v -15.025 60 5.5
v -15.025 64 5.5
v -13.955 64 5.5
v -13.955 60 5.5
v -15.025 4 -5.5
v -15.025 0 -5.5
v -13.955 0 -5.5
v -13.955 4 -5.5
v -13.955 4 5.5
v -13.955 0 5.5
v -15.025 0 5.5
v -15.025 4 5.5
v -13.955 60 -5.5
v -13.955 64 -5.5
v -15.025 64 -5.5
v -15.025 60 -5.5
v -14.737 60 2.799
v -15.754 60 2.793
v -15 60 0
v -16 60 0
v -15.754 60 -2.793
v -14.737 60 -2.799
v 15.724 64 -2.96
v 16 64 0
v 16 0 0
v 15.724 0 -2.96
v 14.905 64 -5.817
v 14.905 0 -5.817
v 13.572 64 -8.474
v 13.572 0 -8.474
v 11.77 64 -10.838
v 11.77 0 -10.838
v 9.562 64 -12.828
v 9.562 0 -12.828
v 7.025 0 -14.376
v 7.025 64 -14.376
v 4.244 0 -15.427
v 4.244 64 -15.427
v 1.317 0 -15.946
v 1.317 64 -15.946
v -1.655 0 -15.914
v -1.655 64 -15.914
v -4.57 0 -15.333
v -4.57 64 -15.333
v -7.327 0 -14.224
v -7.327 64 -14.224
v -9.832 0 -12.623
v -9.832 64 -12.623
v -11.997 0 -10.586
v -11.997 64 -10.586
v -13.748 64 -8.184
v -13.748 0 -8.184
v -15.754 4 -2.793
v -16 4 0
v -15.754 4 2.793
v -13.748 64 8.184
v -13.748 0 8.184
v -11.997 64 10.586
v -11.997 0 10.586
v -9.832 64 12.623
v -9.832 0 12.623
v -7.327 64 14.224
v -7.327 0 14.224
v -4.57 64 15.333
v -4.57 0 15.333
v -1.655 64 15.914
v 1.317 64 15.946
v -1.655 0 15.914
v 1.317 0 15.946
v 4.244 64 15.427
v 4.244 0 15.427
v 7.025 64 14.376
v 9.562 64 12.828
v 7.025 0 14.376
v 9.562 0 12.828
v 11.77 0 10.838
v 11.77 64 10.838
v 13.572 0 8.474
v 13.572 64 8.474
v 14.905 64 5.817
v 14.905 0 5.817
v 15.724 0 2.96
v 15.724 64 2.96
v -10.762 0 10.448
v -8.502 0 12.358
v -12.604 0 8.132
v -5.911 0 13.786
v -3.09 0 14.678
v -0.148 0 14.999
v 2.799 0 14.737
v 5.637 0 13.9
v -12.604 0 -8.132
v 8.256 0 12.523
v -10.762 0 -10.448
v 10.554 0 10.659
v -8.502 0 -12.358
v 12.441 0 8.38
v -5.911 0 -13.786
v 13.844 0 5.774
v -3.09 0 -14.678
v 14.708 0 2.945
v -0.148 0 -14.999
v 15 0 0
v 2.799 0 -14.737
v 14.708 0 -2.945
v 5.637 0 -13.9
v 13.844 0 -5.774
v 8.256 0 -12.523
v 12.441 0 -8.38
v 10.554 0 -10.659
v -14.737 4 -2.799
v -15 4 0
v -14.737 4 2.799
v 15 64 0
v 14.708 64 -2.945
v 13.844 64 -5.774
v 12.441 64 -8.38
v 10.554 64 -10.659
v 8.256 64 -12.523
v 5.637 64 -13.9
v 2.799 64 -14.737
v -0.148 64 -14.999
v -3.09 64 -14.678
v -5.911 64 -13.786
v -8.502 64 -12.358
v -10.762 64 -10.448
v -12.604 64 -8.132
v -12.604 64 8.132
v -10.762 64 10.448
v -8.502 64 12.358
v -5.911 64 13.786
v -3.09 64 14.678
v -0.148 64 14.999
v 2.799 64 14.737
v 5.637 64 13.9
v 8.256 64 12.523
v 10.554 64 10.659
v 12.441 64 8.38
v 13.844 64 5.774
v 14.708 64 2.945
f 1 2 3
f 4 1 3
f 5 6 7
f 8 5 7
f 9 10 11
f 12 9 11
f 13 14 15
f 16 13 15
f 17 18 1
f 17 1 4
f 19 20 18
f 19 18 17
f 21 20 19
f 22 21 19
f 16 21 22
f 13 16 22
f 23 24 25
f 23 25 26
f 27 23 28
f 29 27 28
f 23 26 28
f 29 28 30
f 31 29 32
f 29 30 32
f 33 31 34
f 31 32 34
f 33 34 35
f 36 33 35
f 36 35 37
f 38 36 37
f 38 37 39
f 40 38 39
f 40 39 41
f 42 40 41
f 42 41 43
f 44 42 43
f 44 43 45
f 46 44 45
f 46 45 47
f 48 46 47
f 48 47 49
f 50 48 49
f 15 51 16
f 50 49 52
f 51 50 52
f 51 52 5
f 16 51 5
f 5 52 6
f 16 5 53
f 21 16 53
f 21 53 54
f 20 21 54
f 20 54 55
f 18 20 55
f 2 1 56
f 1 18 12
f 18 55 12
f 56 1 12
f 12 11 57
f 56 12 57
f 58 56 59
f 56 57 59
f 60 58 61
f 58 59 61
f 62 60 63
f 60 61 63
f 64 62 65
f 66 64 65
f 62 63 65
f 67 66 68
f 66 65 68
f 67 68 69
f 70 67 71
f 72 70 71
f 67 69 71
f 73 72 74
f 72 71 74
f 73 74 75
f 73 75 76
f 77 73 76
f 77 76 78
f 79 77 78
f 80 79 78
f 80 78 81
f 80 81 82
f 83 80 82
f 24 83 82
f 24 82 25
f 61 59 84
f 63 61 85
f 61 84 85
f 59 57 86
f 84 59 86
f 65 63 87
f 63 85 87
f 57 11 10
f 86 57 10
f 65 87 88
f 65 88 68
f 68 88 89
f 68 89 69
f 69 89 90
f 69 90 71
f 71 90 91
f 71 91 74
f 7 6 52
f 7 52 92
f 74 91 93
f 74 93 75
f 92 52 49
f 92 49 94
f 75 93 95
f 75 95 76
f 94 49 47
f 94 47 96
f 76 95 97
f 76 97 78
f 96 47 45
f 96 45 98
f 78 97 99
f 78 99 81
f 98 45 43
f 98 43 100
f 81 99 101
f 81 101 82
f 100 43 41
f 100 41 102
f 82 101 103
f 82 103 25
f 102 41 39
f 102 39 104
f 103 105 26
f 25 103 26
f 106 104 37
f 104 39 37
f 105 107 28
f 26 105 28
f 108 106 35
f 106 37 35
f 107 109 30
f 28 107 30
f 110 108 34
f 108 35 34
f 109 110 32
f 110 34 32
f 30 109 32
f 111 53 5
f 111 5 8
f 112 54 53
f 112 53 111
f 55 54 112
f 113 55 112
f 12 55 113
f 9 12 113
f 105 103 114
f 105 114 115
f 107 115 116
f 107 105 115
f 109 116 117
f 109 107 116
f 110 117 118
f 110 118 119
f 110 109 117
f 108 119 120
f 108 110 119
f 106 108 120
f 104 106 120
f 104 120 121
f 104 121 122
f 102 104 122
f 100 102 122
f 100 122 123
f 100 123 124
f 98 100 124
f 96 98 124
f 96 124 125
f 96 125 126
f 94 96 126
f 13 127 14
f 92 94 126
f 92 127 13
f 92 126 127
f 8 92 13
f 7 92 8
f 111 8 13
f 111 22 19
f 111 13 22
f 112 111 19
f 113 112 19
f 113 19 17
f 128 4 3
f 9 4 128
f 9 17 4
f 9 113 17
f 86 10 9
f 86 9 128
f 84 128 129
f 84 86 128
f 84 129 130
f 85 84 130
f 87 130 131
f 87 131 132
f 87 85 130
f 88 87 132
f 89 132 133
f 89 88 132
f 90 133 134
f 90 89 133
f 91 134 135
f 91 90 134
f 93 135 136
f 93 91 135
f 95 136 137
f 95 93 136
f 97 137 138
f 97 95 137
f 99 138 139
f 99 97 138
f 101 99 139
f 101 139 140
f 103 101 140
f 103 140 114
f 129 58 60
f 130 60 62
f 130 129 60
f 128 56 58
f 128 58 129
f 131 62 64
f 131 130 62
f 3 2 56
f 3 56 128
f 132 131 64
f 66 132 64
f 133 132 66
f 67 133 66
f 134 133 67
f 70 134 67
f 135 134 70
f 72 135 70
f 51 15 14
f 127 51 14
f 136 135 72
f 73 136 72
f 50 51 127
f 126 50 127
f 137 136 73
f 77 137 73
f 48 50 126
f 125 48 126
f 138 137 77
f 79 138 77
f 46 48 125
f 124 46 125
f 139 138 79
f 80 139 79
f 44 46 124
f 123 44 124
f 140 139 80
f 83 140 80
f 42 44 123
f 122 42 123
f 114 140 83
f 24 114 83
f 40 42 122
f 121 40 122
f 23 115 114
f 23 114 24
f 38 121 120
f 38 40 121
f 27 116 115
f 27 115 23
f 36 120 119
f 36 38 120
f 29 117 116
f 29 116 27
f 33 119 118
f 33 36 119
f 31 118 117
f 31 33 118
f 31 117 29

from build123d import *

# Parameters (mm, degrees)
SKETCH1_R           = 16
SKETCH1_R_2         = 15
BOSS_EXTRUDE1_DEPTH = 64
CUT_EXTRUDE1_DEPTH  = 4
CUT_EXTRUDE2_DEPTH  = 4


with BuildPart() as part:
    # Sketch1 → Boss-Extrude1 (new body)
    with BuildSketch(Plane(origin=(0, 0, 0), x_dir=(1, 0, 0), z_dir=(0, 1, 0))):
        Circle(SKETCH1_R)
        Circle(SKETCH1_R_2, mode=Mode.SUBTRACT)
    extrude(amount=BOSS_EXTRUDE1_DEPTH)

    # Sketch2 → Cut-Extrude1 (cut)
    with BuildSketch(Plane(origin=(0, 64, 0), x_dir=(1, 0, 0), z_dir=(0, 1, 0))):
        Polygon((0, 0), (0, 5.5), (-16.81016258, 5.5), (-16.81016258, -5.5), (0, -5.5), align=None)
    extrude(amount=-CUT_EXTRUDE1_DEPTH, mode=Mode.SUBTRACT)

    # Sketch3 → Cut-Extrude2 (cut)
    with BuildSketch(Plane.XZ):
        Polygon((0, 0), (0, 5.5), (-17.011405804, 5.5), (-17.011405804, -5.5), (0, -5.5), align=None)
    extrude(amount=-CUT_EXTRUDE2_DEPTH, mode=Mode.SUBTRACT)


solid = part.part
